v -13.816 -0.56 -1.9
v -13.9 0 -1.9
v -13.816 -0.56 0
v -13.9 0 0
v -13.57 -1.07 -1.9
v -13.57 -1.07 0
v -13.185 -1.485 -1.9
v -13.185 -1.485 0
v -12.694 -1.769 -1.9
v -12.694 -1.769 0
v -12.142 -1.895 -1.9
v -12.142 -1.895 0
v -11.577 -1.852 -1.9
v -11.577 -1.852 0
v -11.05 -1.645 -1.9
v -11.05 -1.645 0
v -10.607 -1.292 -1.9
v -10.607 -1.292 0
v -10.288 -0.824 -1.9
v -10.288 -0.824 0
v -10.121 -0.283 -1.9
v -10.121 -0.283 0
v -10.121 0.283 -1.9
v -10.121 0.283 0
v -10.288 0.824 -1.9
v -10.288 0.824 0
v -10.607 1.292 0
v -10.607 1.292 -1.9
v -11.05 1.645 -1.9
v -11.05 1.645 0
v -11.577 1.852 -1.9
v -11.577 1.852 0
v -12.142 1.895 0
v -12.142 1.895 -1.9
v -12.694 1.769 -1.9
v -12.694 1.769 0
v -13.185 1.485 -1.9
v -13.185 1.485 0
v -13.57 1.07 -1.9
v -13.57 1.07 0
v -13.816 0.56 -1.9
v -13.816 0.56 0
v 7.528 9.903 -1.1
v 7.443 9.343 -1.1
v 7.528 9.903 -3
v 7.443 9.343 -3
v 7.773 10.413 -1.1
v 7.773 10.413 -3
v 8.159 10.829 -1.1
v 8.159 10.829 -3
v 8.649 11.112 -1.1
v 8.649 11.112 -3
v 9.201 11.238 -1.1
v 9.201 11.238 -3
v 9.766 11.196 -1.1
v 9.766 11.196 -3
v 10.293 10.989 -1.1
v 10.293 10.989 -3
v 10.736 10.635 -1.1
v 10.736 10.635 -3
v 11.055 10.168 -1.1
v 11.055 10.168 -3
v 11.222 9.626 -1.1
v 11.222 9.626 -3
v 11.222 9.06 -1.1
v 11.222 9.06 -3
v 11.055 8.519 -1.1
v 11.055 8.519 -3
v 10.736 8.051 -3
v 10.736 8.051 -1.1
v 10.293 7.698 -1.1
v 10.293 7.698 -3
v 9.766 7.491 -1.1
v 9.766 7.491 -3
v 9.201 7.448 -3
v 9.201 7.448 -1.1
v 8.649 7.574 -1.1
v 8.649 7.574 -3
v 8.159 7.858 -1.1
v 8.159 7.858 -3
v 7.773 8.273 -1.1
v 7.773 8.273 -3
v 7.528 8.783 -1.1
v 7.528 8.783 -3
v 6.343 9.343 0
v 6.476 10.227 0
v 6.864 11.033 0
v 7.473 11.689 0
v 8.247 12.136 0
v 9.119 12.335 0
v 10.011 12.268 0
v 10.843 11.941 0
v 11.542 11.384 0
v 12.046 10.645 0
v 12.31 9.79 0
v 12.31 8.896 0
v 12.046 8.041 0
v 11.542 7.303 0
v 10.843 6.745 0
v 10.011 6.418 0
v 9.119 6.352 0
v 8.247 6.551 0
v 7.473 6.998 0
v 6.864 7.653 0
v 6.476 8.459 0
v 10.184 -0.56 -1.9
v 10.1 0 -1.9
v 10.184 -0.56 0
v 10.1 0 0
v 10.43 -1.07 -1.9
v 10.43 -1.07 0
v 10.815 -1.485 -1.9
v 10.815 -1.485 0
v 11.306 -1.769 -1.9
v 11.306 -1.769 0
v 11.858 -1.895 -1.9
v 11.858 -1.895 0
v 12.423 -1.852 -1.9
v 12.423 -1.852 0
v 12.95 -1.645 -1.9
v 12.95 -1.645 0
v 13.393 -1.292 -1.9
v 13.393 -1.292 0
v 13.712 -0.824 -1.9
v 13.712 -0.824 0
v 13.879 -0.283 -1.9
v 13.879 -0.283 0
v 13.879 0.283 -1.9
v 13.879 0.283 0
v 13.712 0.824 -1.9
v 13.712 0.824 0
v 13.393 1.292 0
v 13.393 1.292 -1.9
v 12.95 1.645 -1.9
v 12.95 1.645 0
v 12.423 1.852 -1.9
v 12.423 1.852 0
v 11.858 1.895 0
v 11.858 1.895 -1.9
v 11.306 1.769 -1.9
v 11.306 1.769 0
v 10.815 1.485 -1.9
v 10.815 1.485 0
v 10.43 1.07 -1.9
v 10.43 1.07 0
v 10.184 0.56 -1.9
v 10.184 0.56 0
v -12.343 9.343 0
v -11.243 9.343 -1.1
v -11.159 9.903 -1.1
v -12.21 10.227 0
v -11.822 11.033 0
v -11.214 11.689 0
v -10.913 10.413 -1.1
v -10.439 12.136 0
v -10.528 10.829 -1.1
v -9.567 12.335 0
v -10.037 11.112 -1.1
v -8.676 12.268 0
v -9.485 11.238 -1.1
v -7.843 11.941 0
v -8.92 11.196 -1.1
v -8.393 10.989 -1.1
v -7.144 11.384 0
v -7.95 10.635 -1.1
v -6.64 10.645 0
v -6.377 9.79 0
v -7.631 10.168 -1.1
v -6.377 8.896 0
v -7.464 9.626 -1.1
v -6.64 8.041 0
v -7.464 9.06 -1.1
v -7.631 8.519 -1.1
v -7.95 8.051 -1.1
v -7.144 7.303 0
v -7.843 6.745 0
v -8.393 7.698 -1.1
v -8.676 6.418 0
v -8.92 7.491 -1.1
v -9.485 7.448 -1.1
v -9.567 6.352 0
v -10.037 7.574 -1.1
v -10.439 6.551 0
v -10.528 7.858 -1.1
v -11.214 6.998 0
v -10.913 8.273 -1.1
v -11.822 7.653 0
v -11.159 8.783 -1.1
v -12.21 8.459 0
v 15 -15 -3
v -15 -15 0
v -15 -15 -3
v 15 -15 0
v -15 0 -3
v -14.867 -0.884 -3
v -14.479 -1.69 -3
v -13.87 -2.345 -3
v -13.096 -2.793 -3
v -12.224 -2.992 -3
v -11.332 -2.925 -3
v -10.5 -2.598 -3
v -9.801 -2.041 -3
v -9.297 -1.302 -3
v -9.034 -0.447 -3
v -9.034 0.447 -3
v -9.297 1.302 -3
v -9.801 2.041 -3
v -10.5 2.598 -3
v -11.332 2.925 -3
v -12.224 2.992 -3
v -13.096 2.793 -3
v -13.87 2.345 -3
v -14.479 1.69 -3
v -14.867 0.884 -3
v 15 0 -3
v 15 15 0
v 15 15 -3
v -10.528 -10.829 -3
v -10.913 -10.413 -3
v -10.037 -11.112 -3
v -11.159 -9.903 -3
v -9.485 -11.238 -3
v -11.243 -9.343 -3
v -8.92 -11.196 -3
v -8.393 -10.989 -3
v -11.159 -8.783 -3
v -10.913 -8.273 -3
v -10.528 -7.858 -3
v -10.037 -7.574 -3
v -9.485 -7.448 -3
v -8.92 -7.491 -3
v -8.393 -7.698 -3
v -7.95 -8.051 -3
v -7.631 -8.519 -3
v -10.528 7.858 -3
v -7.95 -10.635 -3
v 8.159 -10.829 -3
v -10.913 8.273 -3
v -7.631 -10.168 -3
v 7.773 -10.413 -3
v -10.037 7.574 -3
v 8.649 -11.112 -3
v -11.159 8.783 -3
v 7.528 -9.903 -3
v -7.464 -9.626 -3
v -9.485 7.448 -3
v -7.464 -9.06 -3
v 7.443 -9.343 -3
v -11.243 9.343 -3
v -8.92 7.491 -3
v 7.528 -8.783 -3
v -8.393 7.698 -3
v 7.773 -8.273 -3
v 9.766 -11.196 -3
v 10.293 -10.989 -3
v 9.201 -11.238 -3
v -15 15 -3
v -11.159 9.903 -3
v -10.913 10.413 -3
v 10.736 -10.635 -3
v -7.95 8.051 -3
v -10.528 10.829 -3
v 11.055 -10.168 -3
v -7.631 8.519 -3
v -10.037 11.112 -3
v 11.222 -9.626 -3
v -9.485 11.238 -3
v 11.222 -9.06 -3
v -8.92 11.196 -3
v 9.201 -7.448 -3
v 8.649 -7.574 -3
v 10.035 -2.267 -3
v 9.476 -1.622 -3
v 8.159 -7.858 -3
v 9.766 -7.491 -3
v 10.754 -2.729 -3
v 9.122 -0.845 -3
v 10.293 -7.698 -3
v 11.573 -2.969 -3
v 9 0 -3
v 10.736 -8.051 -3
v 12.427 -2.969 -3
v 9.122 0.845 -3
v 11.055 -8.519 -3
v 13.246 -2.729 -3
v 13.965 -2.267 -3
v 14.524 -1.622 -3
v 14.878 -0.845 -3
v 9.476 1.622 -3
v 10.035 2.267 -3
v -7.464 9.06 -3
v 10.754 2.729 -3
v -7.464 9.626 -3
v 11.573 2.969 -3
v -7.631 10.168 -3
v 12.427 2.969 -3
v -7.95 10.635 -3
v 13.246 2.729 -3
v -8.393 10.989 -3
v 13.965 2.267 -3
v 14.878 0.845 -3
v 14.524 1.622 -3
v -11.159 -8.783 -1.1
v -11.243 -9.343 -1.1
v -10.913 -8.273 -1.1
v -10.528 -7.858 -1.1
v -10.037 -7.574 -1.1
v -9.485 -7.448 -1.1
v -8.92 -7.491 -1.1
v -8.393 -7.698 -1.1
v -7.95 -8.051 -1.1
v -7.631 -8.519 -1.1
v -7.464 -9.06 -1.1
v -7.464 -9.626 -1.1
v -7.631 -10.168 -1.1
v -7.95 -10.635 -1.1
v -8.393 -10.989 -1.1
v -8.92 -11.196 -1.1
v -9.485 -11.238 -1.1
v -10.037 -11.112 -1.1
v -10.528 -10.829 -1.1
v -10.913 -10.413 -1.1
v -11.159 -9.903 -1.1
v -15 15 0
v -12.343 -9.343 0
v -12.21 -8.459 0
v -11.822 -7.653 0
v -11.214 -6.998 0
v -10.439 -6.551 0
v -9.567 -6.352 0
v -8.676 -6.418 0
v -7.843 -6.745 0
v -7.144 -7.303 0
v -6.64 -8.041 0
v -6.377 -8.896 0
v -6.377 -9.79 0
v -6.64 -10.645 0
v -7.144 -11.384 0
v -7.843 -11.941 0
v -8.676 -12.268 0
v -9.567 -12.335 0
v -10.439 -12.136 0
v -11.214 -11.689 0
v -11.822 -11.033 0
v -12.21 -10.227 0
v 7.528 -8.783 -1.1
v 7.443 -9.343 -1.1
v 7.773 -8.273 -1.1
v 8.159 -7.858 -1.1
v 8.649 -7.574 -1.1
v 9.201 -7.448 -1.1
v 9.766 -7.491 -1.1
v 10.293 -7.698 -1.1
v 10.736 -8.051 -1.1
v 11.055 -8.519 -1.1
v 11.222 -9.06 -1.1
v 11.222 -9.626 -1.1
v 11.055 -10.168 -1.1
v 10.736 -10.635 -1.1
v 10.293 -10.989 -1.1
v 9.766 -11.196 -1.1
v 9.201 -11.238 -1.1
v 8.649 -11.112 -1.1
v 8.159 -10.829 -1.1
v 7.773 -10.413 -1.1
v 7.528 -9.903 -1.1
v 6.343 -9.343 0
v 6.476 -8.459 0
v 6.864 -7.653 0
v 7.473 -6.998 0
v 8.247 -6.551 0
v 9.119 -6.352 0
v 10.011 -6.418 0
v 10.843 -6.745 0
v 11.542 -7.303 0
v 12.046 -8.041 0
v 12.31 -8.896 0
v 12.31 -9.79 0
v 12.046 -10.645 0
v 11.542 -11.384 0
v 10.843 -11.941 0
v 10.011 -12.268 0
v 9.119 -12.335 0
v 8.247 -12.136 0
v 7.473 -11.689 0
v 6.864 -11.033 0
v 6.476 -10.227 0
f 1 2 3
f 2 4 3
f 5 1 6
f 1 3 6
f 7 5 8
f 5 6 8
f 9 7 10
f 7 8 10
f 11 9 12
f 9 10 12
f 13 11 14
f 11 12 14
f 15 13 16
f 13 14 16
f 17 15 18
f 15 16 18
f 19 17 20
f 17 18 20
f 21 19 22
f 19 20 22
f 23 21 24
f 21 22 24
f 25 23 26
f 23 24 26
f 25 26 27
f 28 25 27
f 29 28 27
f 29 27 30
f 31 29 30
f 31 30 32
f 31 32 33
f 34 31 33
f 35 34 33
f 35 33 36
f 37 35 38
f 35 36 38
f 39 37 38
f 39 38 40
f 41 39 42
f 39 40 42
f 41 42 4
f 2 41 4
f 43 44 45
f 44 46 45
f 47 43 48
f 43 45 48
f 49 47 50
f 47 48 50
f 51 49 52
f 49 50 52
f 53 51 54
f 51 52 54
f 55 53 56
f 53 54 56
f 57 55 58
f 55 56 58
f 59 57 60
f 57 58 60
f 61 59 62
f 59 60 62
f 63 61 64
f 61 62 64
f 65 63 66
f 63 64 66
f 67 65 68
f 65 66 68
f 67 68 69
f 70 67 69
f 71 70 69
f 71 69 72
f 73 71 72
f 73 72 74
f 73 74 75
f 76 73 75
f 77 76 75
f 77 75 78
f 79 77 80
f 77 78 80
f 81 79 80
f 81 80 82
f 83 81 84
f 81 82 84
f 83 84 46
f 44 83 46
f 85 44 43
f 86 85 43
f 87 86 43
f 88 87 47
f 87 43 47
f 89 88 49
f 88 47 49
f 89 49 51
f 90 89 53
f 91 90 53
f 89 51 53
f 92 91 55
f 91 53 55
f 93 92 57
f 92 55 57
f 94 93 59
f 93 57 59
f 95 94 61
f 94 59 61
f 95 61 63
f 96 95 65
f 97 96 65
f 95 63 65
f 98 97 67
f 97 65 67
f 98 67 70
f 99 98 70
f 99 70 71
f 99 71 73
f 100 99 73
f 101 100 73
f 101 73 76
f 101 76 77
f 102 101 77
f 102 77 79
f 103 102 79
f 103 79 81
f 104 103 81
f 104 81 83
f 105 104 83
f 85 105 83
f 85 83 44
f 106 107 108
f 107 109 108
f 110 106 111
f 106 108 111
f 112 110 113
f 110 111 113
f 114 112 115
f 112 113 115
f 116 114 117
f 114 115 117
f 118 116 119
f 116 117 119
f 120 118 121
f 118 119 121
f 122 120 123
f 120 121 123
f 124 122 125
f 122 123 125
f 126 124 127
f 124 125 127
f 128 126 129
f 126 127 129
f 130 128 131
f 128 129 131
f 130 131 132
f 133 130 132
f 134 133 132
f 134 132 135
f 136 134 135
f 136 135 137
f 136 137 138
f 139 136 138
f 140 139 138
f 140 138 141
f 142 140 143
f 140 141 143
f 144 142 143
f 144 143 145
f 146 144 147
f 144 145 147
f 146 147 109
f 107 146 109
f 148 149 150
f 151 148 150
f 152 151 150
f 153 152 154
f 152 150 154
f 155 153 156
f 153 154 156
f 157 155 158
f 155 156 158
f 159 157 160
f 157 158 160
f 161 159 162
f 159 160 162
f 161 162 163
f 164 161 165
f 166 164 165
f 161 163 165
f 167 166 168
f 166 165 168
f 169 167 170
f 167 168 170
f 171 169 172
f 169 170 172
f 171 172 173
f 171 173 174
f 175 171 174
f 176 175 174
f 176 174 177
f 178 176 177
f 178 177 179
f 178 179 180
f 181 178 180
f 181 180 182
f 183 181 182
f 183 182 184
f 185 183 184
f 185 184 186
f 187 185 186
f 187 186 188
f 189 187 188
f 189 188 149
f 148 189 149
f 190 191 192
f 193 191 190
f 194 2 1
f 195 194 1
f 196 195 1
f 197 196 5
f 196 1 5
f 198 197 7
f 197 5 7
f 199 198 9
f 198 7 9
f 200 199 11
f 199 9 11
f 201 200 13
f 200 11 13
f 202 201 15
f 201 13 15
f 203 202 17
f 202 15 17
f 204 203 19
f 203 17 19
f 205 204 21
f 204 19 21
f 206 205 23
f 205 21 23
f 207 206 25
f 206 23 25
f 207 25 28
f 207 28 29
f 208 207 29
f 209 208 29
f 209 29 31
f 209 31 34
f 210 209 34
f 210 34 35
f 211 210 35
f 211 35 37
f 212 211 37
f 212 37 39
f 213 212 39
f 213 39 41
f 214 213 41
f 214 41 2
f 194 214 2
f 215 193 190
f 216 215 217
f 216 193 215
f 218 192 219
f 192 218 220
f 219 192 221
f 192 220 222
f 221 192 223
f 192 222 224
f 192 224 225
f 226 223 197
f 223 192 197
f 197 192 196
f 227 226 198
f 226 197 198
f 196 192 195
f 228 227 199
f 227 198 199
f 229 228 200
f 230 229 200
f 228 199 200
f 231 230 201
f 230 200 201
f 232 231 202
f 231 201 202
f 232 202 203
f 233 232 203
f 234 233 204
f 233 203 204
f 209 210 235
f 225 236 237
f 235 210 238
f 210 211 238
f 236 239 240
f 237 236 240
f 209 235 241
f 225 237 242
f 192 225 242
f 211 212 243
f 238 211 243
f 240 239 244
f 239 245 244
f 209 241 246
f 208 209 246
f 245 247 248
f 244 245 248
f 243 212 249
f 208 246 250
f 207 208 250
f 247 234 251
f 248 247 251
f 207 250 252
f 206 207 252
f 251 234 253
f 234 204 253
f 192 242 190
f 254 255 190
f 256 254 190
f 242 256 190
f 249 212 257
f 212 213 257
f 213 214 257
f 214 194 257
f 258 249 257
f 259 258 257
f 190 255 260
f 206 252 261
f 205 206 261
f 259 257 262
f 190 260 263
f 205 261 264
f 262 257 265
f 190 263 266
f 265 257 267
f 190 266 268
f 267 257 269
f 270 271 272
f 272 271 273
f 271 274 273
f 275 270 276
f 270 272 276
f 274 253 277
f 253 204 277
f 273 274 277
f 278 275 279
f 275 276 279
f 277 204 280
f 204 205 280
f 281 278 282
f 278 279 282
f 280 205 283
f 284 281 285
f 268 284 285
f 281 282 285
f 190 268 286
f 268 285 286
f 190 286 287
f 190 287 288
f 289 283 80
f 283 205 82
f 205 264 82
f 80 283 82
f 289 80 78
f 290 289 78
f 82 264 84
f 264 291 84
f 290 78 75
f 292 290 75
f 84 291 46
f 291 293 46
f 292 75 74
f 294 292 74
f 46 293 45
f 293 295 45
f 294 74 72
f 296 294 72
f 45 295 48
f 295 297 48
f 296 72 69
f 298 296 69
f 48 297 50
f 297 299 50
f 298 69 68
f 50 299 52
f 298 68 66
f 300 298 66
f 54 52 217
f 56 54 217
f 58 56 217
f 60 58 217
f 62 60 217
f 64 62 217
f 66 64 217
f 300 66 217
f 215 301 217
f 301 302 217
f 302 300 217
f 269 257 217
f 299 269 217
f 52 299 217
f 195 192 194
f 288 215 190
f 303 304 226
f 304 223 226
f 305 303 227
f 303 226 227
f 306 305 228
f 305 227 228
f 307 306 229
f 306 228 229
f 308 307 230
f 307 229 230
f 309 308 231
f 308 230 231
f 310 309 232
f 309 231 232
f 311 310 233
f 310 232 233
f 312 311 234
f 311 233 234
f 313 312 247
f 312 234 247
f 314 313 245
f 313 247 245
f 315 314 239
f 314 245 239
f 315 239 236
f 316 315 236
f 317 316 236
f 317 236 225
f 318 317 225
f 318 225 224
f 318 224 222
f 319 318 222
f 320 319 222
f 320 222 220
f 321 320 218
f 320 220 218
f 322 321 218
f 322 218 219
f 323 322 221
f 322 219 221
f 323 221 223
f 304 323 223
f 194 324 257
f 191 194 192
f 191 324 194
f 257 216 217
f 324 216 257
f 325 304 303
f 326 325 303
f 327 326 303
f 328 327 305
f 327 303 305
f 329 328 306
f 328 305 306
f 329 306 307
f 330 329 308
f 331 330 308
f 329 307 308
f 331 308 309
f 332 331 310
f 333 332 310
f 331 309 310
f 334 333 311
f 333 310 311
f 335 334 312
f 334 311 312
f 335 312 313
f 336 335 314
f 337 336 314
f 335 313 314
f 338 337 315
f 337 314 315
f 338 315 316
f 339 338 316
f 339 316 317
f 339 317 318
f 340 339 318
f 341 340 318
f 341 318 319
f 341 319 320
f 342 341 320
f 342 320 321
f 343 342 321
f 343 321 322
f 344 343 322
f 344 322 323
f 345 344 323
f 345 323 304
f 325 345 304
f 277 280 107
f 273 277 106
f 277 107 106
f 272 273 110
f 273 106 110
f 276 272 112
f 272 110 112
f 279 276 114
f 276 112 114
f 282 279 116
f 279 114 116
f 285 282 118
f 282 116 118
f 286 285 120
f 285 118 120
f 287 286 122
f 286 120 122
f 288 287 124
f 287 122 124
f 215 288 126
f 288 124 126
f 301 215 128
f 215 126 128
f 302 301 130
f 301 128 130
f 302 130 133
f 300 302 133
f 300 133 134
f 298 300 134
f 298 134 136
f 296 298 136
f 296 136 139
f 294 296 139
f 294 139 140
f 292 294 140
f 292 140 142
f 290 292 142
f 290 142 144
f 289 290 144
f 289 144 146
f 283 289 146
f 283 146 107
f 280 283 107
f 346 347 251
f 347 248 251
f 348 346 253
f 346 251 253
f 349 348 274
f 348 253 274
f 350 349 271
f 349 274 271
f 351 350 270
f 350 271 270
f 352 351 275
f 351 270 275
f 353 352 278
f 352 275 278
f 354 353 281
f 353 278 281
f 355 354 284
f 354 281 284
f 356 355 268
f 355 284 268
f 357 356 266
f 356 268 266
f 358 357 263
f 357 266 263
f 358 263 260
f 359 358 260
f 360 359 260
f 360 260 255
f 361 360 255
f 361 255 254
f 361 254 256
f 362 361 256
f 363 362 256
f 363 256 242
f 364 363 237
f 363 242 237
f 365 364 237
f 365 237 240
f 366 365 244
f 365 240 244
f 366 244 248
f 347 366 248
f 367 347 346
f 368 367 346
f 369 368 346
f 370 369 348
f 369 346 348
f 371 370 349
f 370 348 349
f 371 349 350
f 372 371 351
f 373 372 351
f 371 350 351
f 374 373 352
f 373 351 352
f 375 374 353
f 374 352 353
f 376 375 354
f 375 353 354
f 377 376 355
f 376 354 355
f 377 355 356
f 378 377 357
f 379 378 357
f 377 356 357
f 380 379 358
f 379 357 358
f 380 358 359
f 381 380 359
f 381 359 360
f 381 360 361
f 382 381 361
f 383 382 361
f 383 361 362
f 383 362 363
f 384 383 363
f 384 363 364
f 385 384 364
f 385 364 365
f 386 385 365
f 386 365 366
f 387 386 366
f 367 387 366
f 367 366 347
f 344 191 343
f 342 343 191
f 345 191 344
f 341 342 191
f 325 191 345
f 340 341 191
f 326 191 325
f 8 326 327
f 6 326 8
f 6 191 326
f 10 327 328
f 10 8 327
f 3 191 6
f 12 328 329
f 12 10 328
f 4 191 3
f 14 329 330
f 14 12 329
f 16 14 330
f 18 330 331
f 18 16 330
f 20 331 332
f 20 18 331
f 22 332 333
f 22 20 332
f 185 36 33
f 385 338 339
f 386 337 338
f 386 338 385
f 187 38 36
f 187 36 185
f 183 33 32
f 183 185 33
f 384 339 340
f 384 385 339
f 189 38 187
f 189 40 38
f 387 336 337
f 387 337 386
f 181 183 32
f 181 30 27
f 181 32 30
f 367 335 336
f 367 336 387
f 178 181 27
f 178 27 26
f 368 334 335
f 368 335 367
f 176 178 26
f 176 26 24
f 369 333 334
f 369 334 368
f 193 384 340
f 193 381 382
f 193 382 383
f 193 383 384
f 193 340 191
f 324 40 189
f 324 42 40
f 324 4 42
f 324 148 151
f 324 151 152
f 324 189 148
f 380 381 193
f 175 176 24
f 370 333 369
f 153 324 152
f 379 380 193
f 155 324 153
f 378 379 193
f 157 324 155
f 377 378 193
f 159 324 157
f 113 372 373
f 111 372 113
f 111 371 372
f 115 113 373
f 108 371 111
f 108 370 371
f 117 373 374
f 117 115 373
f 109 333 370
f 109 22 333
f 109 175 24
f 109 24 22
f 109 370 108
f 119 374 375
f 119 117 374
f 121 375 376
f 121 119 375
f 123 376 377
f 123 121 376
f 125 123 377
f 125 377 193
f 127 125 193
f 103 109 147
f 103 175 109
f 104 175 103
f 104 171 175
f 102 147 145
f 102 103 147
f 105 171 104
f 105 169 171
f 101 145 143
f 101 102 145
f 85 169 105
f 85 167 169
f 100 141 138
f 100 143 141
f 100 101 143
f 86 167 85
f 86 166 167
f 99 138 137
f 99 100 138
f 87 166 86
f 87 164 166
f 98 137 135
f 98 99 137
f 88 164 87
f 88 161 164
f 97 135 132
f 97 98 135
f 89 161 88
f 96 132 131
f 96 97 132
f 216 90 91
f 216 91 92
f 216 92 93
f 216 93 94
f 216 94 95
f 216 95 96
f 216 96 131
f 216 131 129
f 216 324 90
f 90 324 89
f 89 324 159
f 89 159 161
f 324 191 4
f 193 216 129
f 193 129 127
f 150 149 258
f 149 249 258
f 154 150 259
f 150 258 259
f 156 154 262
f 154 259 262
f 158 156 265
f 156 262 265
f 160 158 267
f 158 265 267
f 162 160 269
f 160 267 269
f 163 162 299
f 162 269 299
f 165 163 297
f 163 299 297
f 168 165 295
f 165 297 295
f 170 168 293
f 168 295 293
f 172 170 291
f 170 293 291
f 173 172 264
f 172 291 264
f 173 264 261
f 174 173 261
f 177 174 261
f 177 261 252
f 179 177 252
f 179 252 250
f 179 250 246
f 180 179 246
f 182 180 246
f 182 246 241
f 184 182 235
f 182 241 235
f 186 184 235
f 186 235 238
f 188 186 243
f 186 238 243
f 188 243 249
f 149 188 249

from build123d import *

# Parameters (mm, degrees)
F1_DEPTH       = 3
F2_D           = 3.8
F2_CSINK_D     = 6
F2_CSINK_ANGLE = 90
F4_D           = 3.8
F4_CSINK_D     = 6
F4_CSINK_ANGLE = 90


with BuildPart() as f1:
    # F0 (on Top) → F1 (new body)
    with BuildSketch(Plane.XY):
        Polygon((0, 0), (15, 15), (-15, 15), align=None)
        Polygon((15, -15), (15, 15), (0, 0), align=None)
        Polygon((0, 0), (-15, 15), (-15, -15), align=None)
        Polygon((-15, -15), (15, -15), (0, 0), align=None)
    extrude(amount=-F1_DEPTH)

    # F2 (through all)
    with Locations(Plane.XY):
        with Locations((-9.343146, 9.343146), (9.343146, 9.343146), (-9.343146, -9.343146), (9.343146, -9.343146)):
            CounterSinkHole(F2_D / 2, F2_CSINK_D / 2, counter_sink_angle=F2_CSINK_ANGLE)

    # F4 (through all)
    with Locations(Plane(origin=(0, 0, -3), x_dir=(1, 0, 0), z_dir=(0, 0, -1))):
        with Locations((-12, 0), (12, 0)):
            CounterSinkHole(F4_D / 2, F4_CSINK_D / 2, counter_sink_angle=F4_CSINK_ANGLE)


solid = f1.part
